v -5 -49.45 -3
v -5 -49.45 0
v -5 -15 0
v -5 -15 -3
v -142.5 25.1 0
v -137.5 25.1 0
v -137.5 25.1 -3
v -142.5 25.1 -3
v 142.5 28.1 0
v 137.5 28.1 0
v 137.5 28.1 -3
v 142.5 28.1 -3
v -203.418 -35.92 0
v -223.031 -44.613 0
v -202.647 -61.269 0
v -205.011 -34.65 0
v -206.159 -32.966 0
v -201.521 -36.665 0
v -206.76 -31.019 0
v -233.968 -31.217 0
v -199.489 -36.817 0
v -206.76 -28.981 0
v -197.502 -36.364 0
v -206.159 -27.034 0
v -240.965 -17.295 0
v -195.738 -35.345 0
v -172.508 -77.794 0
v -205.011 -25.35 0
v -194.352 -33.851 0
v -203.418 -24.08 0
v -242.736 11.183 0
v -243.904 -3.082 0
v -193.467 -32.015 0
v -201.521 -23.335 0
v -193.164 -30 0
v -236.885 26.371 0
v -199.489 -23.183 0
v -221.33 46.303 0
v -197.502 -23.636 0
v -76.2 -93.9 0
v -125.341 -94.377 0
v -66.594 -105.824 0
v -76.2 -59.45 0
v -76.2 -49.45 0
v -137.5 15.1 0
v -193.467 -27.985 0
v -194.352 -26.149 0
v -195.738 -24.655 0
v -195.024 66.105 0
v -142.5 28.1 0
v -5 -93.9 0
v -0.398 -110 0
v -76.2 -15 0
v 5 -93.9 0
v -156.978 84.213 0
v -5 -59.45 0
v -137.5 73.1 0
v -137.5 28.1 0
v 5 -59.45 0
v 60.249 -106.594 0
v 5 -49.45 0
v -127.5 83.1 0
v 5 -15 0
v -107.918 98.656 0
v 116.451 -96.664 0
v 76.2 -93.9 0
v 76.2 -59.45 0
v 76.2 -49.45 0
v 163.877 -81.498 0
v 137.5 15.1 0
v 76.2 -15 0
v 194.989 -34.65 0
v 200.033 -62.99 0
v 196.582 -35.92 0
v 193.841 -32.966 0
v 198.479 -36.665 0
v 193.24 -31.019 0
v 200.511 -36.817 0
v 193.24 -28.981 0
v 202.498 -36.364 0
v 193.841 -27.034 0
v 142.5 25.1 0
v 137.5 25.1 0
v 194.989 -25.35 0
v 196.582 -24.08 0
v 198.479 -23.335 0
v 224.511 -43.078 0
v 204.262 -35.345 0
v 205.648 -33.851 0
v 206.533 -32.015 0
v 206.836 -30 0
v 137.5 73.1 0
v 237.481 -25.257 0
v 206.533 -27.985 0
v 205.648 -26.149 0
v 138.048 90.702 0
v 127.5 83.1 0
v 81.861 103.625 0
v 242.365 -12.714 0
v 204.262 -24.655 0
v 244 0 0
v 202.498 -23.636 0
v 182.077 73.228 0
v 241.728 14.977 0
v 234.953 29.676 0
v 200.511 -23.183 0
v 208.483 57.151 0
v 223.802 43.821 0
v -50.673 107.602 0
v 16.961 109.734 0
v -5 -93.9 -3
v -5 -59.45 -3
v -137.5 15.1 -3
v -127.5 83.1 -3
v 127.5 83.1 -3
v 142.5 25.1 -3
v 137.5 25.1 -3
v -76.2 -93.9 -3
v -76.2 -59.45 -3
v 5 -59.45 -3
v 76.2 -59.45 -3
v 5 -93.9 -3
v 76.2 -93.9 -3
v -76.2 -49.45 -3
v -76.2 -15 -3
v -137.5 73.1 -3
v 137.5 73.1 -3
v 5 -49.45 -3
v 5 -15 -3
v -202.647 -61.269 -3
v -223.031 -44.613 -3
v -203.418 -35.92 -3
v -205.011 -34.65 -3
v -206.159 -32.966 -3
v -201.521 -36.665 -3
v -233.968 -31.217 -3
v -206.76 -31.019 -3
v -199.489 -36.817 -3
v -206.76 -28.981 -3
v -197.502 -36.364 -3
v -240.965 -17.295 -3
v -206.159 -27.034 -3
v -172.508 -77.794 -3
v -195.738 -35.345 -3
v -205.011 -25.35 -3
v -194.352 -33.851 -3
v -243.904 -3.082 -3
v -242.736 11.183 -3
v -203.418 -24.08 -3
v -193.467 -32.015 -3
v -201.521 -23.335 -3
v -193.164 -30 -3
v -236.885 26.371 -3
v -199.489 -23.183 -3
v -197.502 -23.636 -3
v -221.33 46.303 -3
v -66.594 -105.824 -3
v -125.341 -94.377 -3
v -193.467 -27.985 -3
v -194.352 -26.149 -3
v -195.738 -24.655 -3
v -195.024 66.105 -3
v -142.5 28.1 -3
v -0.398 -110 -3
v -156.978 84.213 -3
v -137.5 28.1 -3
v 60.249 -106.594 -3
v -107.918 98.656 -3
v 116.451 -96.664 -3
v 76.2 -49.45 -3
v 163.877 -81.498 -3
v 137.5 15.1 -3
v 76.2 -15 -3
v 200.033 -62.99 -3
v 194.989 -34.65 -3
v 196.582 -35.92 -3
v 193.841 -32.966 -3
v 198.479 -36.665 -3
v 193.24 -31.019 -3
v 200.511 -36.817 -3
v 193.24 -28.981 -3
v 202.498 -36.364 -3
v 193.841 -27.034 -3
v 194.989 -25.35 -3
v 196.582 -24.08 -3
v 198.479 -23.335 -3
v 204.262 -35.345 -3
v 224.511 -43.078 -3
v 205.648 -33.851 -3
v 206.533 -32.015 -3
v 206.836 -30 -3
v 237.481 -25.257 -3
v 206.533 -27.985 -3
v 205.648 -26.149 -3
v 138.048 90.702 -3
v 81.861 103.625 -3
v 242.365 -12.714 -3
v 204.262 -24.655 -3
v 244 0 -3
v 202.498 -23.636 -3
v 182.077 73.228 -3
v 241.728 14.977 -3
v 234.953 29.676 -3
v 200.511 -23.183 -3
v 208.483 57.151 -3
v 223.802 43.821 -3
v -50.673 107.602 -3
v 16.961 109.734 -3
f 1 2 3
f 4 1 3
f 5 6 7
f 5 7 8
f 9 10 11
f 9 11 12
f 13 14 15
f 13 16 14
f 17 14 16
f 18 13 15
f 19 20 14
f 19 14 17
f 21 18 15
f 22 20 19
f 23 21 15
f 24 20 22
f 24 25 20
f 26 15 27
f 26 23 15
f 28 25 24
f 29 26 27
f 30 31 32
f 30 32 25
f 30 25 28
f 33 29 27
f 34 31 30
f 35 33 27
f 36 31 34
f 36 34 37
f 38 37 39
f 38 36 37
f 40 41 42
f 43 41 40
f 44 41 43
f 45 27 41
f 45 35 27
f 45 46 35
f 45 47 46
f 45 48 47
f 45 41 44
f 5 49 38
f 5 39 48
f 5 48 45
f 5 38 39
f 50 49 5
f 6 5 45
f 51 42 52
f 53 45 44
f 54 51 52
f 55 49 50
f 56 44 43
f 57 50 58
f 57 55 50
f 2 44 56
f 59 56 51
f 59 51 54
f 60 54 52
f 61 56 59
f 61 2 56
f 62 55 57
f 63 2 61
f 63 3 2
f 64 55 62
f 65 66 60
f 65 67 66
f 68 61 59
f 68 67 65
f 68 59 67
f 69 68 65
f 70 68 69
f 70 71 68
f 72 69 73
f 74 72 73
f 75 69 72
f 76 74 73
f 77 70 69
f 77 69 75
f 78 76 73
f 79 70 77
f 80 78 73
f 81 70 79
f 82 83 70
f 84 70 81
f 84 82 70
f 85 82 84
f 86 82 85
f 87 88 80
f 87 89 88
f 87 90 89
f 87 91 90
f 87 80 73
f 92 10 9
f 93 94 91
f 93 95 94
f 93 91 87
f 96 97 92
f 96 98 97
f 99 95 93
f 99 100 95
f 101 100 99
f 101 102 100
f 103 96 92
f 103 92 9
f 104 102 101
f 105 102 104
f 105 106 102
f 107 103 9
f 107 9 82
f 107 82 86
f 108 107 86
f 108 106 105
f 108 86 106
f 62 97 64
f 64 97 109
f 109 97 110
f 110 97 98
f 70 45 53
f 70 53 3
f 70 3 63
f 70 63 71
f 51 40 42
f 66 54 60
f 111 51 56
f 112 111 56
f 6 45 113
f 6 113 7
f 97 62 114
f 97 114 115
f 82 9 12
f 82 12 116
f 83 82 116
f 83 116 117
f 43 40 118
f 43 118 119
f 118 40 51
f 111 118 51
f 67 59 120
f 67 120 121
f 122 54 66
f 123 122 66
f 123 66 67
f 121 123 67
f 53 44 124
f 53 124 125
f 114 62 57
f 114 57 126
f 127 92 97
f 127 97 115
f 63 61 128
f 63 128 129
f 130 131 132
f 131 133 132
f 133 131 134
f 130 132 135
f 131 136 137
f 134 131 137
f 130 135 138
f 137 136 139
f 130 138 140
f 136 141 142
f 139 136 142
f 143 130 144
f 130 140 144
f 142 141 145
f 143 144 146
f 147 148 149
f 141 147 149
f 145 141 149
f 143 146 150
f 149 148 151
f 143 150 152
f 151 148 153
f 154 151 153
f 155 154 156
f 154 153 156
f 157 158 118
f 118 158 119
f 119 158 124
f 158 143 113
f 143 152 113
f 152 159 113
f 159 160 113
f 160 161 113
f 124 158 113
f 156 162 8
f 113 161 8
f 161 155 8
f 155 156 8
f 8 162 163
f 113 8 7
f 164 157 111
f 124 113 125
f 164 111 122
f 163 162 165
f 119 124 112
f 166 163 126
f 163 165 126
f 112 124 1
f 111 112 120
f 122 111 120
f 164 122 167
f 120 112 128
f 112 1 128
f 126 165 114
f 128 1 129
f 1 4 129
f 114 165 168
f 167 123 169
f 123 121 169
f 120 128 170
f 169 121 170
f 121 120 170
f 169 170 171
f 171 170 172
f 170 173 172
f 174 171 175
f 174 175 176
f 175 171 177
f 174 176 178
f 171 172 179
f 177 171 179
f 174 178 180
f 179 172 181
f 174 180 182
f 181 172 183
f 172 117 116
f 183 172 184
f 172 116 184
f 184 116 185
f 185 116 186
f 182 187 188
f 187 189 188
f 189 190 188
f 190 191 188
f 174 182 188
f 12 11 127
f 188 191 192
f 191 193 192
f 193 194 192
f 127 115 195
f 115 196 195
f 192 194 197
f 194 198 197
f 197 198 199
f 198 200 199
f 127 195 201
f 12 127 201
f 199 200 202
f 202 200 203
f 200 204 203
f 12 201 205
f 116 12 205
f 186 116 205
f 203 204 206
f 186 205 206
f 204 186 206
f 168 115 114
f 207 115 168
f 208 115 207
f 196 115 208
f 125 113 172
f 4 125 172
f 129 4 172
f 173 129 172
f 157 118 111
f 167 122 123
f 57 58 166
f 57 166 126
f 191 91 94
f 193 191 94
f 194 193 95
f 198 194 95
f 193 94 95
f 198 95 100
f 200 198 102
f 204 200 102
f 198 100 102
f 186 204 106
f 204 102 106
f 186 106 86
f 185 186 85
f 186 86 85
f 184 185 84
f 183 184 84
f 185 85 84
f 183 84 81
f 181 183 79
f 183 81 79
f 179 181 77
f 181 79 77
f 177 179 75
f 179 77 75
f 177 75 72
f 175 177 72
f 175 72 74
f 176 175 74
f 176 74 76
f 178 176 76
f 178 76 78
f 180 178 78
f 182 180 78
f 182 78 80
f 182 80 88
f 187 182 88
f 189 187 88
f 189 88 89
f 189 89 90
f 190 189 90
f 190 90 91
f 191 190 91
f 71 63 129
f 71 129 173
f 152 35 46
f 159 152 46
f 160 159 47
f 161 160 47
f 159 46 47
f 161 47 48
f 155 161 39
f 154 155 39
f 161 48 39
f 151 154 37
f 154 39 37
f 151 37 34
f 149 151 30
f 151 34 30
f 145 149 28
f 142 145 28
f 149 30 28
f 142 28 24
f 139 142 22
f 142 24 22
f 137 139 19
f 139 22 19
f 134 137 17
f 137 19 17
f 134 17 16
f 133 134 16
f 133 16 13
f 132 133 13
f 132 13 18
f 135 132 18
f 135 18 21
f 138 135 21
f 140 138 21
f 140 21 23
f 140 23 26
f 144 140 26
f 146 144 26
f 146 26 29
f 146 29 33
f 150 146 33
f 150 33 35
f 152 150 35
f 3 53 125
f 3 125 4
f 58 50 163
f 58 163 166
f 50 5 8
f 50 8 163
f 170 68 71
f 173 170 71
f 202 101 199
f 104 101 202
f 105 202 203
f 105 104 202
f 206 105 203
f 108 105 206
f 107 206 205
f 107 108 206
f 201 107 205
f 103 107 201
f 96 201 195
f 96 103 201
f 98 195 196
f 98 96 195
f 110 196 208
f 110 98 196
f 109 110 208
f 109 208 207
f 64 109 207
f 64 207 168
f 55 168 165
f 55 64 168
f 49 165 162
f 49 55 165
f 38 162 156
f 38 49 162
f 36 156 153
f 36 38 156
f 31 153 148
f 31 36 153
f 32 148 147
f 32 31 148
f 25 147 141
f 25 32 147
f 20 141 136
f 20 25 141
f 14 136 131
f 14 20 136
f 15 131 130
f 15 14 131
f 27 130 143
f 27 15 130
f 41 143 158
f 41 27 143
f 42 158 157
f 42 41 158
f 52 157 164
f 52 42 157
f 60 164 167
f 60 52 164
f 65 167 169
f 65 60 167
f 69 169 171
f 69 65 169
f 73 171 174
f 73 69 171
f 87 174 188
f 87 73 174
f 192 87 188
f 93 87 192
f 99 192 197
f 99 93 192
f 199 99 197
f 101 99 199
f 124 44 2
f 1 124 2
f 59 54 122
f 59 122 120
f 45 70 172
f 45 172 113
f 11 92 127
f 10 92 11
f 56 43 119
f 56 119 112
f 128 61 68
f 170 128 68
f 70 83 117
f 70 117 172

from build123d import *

# Parameters (mm, degrees)
SKETCH1_RX          = 244
SKETCH1_RY          = 110
BOSS_EXTRUDE1_DEPTH = 3
CUT_EXTRUDE5_DEPTH  = 4
SKETCH13_W          = 71.2
SKETCH13_H          = 34.45
CUT_EXTRUDE7_DEPTH  = 4
SKETCH12_R          = 6.83635542
CUT_EXTRUDE8_DEPTH  = 4
CHAMFER1_SIZE       = 10


with BuildPart() as part:
    # Sketch1 → Boss-Extrude1 (new body)
    with BuildSketch(Plane.XY):
        with Locations((0, 0)):
            Ellipse(SKETCH1_RX, SKETCH1_RY)
    extrude(amount=-BOSS_EXTRUDE1_DEPTH)

    # Sketch10 → Cut-Extrude5 (cut, through all)
    with BuildSketch(Plane.XY):
        Polygon((-137.5, 83.1), (137.5, 83.1), (137.5, 28.1), (142.5, 28.1), (142.5, 25.1), (137.5, 25.1), (137.5, 15.1), (-137.5, 15.1), (-137.5, 25.1), (-142.5, 25.1), (-142.5, 28.1), (-137.5, 28.1), align=None)
    extrude(amount=-CUT_EXTRUDE5_DEPTH, mode=Mode.SUBTRACT)

    # Sketch13 → Cut-Extrude7 (cut, through all)
    with BuildSketch(Plane.XY):
        with Locations((-40.6, -32.225)):
            Rectangle(SKETCH13_W, SKETCH13_H)
        with Locations((-40.6, -76.675)):
            Rectangle(SKETCH13_W, SKETCH13_H)
        with Locations((40.6, -32.225)):
            Rectangle(SKETCH13_W, SKETCH13_H)
        with Locations((40.6, -76.675)):
            Rectangle(SKETCH13_W, SKETCH13_H)
    extrude(amount=-CUT_EXTRUDE7_DEPTH, mode=Mode.SUBTRACT)

    # Sketch12 → Cut-Extrude8 (cut, through all)
    with BuildSketch(Plane.XY):
        with Locations((200, -30)):
            Circle(SKETCH12_R)
        with Locations((-200, -30)):
            Circle(SKETCH12_R)
    extrude(amount=-CUT_EXTRUDE8_DEPTH, mode=Mode.SUBTRACT)

    # Chamfer1
    chamfer1_edges = [part.edges().sort_by_distance(p)[0] for p in [
        (-137.5, 83.1, -1.5),
        (137.5, 83.1, -1.5),
    ]]
    chamfer(chamfer1_edges, length=CHAMFER1_SIZE)


solid = part.part
